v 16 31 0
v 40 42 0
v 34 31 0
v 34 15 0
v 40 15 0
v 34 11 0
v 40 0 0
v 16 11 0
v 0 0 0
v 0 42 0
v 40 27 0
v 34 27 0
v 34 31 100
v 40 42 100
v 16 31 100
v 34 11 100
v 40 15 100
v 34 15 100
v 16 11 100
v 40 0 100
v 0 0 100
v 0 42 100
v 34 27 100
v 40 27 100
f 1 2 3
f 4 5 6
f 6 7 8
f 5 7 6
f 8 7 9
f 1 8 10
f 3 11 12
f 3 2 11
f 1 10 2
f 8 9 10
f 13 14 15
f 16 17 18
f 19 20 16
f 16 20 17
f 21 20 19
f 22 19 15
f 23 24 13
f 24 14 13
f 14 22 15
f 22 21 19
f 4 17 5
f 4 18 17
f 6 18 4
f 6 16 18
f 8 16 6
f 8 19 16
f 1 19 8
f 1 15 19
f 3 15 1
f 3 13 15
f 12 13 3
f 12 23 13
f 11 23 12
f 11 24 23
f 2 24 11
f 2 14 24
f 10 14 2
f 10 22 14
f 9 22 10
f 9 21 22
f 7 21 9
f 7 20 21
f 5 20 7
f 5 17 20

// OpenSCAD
$fn = 32;

// ----------------------------------------------------------------------
// T-slot rail: 40 x 42 mm section, 100 mm long
// ----------------------------------------------------------------------

// --- parameters (mm) ---
profile_height = 100;     // extrusion height
profile_points = 12;      // points of the closed outline

profile = [[0, 0], [40, 0], [40, 15], [34, 15], [34, 11], [16, 11], [16, 31], [34, 31], [34, 27], [40, 27], [40, 42], [0, 42]];  // single closed polygon, 12 points, counter clockwise

// --- the one profile operation ---
linear_extrude(height = profile_height) polygon(points = profile);
